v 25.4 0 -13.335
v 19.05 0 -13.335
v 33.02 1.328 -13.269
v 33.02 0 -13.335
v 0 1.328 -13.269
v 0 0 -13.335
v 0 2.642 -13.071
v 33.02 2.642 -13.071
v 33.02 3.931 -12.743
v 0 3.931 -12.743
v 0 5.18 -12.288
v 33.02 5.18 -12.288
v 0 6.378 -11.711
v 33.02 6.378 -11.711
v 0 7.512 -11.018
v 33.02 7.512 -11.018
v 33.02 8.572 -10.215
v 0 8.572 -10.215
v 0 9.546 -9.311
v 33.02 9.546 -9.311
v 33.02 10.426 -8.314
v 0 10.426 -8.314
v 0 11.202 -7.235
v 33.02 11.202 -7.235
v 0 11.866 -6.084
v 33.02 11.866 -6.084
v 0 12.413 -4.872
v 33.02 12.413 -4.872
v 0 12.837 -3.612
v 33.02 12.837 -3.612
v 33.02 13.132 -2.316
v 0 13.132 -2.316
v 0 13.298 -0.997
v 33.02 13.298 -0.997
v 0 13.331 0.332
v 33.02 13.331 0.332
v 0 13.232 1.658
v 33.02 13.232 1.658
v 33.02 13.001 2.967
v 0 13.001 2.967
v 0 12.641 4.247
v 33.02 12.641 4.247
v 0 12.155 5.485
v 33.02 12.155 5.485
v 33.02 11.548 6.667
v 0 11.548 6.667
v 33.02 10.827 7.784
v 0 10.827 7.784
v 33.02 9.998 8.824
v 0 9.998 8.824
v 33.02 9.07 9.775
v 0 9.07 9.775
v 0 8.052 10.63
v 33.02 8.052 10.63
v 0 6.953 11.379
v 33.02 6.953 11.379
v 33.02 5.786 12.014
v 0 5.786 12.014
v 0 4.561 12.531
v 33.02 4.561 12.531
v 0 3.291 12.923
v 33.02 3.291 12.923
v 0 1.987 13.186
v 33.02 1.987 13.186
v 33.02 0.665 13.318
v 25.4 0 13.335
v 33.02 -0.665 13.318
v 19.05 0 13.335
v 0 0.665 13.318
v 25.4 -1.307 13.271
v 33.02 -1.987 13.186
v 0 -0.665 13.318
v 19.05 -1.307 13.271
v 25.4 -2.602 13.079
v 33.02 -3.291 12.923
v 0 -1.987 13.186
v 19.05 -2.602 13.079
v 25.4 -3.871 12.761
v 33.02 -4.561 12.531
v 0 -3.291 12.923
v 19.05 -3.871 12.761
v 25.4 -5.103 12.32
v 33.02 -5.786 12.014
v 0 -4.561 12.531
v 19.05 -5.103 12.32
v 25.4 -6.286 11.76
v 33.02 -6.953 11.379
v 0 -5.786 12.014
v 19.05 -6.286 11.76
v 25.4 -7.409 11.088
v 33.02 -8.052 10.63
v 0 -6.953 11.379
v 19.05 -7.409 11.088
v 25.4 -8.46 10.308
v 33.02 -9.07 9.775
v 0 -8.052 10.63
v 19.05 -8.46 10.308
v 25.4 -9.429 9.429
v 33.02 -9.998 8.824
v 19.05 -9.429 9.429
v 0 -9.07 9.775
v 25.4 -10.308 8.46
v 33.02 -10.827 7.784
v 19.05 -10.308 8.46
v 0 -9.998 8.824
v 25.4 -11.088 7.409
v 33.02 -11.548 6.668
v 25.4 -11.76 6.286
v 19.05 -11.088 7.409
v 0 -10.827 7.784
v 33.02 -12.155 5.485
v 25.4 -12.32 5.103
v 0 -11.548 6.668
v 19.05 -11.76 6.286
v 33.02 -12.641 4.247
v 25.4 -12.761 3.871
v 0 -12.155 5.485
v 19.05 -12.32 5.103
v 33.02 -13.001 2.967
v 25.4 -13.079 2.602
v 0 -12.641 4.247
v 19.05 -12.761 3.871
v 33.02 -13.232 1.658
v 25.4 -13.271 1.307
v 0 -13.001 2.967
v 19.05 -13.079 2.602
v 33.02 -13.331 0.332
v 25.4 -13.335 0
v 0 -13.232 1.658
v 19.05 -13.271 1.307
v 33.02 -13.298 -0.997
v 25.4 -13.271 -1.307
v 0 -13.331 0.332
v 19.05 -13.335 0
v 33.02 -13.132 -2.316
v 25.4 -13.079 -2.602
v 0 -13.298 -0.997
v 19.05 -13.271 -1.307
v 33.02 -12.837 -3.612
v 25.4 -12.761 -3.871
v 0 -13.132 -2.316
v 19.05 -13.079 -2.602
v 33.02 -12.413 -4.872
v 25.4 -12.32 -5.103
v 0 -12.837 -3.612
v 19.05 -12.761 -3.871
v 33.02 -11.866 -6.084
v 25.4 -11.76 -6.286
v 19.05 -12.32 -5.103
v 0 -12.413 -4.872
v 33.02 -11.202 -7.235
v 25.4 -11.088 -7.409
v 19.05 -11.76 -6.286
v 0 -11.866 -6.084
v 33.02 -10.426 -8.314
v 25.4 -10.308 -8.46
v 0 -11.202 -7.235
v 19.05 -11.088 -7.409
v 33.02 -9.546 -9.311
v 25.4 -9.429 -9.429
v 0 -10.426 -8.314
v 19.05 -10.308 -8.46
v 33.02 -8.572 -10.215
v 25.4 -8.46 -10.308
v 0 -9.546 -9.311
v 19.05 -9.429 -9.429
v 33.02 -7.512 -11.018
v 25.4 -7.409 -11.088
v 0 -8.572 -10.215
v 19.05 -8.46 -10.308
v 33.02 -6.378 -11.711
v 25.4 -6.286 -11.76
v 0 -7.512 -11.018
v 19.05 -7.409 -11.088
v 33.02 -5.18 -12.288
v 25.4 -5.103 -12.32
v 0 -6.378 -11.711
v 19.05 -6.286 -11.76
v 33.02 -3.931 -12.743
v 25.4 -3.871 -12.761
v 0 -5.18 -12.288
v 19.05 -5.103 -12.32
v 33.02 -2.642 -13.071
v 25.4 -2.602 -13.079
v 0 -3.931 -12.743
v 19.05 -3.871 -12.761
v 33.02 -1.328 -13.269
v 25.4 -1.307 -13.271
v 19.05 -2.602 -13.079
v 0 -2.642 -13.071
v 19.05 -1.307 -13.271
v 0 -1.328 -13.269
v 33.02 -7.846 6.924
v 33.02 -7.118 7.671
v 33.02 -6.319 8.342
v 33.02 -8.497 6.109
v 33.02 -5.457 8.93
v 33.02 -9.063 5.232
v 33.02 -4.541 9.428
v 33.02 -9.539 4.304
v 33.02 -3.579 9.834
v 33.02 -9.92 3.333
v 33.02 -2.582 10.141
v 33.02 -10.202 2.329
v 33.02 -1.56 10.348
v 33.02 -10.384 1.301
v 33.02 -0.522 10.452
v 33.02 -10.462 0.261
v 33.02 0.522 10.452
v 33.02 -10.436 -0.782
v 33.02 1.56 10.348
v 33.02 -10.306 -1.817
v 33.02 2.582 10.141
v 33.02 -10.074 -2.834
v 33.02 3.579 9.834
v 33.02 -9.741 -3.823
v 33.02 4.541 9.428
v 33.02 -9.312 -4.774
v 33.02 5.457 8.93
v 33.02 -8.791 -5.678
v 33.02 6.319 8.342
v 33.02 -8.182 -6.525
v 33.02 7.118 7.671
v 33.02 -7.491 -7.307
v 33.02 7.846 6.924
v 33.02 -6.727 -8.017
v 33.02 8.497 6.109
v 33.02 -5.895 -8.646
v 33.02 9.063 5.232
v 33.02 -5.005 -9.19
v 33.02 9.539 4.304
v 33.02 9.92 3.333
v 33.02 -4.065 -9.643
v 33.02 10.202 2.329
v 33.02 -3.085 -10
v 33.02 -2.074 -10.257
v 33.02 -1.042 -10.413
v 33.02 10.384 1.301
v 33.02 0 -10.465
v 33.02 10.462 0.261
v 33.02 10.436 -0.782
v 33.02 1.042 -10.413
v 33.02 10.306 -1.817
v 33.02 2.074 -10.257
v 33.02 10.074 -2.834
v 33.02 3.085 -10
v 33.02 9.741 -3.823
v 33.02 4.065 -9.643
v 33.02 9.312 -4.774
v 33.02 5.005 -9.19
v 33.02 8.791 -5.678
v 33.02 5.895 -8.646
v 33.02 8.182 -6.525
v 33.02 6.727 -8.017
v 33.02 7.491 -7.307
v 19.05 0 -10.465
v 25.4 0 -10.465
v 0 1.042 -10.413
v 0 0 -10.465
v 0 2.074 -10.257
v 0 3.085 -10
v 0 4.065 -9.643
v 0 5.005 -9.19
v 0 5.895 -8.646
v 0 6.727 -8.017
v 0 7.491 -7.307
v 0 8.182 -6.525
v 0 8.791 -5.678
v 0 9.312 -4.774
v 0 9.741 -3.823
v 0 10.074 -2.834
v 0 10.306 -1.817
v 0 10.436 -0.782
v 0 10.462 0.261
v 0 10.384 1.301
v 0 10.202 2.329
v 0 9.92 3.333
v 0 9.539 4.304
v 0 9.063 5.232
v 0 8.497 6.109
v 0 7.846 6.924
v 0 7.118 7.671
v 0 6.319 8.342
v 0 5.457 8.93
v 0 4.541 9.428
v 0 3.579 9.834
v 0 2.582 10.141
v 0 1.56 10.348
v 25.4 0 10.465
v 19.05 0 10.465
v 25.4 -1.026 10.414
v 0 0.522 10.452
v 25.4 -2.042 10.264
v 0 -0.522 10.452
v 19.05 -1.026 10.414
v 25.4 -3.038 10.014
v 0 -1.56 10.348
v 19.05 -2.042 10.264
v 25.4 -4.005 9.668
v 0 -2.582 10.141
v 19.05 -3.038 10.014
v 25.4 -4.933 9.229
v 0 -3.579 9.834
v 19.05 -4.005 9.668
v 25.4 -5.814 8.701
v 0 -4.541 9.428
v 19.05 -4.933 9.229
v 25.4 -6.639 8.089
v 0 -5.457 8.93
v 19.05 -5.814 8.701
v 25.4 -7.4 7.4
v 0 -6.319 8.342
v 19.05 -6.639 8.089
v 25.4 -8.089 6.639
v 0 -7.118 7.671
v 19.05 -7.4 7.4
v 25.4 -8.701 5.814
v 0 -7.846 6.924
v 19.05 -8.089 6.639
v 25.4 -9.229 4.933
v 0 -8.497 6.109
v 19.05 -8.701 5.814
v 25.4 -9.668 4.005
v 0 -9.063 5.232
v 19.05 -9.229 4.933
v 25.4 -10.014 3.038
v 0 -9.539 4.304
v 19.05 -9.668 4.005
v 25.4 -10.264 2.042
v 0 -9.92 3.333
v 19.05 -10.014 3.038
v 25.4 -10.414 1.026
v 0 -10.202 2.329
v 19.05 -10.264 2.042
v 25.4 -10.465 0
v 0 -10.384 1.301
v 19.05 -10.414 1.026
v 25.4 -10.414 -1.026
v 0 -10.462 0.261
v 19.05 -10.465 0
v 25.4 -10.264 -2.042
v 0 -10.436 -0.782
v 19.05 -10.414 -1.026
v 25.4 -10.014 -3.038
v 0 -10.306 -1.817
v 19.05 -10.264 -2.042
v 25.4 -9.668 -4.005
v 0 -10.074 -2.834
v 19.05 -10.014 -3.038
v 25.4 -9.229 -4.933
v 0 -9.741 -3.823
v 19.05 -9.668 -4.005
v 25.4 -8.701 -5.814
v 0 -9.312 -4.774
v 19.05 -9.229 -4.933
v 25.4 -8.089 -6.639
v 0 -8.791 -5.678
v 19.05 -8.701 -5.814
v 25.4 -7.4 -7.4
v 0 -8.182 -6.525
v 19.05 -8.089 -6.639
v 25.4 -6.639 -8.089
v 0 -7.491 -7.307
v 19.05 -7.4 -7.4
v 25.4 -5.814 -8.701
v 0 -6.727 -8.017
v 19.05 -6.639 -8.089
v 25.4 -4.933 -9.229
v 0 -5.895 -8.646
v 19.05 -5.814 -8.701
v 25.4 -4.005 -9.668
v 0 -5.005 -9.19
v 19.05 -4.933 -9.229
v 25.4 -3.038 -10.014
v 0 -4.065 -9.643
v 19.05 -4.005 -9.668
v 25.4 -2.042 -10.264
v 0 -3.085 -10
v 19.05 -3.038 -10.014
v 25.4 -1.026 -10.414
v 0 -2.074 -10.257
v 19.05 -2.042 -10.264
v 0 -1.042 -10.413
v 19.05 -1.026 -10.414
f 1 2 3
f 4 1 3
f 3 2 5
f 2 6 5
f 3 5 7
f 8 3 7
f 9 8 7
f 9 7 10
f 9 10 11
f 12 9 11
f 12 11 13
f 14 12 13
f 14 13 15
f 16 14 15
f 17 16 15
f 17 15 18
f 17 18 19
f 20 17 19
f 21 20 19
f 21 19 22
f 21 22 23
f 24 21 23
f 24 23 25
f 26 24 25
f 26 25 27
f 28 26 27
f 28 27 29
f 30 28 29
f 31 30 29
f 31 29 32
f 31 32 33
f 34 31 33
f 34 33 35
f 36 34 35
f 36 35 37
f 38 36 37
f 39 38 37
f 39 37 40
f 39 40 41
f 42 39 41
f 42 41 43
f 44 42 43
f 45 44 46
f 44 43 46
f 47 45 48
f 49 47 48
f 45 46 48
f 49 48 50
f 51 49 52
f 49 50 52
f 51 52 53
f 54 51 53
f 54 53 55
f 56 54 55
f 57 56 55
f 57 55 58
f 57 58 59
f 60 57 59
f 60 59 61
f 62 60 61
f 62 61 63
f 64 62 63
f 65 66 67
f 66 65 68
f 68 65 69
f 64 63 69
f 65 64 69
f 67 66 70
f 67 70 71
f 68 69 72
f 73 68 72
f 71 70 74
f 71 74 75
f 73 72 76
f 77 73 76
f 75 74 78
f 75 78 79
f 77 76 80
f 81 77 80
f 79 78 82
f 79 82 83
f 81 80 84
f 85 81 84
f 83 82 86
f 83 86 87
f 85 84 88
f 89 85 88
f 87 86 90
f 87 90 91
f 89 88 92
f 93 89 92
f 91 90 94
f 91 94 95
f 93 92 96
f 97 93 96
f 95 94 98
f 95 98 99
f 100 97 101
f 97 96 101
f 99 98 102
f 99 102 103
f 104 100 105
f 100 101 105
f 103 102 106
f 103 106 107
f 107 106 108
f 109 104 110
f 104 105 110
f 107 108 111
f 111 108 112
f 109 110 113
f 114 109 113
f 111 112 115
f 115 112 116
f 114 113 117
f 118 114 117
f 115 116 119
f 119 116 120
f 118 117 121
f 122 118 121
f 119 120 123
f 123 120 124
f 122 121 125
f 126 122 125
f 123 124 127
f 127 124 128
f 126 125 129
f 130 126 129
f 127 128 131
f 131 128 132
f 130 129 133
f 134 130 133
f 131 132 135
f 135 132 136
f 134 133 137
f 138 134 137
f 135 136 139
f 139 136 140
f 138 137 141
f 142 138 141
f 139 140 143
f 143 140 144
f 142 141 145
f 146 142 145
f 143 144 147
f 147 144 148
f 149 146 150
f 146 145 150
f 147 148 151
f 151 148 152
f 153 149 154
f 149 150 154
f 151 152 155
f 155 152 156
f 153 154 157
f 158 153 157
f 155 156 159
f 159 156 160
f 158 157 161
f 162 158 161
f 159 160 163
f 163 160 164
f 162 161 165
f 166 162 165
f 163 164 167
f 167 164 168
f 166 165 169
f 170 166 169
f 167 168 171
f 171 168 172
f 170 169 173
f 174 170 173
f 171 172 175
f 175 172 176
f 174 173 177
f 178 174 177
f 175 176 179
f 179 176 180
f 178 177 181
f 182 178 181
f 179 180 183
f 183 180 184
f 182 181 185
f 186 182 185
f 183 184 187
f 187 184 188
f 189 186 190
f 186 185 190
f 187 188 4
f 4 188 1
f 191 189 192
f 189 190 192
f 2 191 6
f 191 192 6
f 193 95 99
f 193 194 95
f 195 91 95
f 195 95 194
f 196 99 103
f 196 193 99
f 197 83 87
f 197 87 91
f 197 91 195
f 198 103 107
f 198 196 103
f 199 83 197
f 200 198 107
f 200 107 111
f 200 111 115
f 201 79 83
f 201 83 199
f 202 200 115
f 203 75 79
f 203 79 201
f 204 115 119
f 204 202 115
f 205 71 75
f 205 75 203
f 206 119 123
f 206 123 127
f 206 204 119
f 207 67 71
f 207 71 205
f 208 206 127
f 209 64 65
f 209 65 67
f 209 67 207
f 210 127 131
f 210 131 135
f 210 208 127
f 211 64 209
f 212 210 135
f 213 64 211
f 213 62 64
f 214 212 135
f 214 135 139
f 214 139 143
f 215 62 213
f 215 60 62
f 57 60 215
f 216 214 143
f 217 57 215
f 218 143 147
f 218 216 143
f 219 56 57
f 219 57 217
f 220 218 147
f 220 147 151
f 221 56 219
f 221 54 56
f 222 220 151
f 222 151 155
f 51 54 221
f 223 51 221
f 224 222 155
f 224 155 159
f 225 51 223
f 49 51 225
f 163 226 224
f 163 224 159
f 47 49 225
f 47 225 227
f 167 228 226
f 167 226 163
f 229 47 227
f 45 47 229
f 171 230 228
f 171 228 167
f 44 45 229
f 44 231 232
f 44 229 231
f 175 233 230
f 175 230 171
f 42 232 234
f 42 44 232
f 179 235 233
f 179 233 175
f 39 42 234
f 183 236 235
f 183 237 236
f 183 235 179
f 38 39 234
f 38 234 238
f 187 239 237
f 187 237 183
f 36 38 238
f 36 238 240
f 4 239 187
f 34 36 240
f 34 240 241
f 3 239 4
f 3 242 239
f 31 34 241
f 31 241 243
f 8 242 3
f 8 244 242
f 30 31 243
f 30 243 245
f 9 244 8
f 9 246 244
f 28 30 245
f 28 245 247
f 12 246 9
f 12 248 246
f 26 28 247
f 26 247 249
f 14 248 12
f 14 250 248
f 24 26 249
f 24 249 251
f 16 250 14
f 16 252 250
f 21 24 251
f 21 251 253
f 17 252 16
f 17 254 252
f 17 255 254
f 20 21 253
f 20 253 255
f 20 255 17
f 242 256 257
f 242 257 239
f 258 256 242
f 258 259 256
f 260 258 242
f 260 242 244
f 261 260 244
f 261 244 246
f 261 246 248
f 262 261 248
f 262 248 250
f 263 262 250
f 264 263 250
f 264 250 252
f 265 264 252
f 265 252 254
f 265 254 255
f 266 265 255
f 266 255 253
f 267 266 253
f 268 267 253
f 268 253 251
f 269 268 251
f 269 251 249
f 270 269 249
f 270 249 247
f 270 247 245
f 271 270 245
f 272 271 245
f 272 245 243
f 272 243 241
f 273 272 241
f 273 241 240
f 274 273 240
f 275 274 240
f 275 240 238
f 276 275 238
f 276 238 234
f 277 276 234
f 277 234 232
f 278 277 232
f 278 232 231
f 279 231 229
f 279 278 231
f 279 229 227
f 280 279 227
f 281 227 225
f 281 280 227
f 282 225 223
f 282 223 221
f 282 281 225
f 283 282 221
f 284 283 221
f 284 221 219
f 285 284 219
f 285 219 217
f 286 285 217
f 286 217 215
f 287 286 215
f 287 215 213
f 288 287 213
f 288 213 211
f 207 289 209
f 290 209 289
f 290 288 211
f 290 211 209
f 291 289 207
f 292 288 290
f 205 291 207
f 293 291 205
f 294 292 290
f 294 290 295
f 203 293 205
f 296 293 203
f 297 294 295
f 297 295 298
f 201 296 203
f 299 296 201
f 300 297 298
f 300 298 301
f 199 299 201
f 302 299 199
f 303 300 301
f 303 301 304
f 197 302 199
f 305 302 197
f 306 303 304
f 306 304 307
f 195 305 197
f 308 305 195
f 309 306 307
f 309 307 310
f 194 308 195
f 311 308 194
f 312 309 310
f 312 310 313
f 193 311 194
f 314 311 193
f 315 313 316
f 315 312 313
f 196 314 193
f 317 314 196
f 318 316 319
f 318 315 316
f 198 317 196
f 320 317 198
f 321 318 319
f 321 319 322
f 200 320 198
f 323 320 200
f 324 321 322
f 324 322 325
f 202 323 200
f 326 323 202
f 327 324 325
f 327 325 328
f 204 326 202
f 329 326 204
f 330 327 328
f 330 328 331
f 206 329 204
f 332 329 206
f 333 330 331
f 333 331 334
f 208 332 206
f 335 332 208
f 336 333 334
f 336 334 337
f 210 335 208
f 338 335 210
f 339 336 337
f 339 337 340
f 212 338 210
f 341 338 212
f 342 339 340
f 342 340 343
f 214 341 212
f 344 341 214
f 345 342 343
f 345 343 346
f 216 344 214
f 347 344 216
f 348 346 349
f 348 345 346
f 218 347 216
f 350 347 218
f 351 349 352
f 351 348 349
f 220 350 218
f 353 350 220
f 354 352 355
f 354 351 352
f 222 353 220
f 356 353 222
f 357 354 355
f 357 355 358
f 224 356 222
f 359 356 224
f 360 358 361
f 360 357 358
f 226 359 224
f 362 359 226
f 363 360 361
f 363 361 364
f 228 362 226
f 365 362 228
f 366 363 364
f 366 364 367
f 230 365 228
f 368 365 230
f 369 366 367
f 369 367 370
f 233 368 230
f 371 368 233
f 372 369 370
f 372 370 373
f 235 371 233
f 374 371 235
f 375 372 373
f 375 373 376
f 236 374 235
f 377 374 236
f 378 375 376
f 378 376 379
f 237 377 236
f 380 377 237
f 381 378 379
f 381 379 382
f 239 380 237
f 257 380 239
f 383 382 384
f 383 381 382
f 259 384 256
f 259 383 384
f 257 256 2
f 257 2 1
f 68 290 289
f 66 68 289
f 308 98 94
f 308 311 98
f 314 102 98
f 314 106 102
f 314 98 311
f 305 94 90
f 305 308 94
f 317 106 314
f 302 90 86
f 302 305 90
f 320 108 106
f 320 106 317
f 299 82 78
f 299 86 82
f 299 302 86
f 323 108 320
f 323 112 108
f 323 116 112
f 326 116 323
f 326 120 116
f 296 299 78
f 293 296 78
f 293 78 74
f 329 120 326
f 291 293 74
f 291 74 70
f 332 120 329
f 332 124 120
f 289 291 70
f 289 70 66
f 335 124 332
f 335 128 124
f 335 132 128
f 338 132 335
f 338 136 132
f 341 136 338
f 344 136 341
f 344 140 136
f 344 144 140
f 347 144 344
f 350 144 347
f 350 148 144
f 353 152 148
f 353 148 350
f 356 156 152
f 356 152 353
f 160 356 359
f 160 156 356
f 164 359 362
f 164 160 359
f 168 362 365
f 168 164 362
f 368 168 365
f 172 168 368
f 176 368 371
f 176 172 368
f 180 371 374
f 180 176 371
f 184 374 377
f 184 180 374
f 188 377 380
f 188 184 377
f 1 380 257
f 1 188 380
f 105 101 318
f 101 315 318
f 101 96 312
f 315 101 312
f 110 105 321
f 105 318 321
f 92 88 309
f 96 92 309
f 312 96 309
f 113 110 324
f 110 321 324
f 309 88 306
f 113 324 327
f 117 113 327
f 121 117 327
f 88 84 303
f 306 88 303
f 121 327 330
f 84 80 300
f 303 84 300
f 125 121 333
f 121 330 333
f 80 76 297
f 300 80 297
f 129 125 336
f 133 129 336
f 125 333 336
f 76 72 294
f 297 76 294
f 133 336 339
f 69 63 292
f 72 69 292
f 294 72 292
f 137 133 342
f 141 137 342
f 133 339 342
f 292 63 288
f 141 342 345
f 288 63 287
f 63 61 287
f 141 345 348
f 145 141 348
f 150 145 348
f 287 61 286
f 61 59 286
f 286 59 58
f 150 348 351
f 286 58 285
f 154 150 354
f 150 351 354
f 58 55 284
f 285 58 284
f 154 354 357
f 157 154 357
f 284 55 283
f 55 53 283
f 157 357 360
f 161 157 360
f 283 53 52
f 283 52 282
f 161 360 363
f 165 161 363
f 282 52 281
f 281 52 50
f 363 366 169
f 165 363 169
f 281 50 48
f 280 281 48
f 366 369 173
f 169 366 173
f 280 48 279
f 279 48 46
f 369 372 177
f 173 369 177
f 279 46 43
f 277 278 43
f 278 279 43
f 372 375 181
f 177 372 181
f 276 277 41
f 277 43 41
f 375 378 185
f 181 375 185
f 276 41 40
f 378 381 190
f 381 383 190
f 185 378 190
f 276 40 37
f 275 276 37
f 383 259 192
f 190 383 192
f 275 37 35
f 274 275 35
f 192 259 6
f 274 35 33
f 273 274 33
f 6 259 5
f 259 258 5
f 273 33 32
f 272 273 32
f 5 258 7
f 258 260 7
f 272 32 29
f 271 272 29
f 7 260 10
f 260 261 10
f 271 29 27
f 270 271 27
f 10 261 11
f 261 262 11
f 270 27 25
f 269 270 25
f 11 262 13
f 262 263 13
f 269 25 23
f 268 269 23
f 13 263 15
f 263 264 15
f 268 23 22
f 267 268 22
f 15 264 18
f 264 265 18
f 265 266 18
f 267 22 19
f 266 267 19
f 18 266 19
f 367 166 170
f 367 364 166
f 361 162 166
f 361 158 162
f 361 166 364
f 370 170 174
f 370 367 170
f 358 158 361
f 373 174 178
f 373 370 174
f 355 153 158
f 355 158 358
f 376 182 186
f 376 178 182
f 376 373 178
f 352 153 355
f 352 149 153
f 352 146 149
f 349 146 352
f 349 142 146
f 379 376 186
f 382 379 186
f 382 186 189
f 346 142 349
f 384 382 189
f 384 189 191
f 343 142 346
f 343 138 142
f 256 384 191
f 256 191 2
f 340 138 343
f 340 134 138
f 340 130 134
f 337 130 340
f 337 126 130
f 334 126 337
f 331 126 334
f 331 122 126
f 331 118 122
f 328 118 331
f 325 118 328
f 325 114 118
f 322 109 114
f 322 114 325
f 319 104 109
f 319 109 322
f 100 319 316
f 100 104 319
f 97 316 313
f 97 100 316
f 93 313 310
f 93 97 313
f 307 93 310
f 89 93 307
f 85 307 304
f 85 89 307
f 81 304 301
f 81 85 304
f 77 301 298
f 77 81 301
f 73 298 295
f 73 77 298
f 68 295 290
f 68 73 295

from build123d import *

# Parameters (mm, degrees)
SKETCH1_R               = 13.335
SKETCH1_R_2             = 10.4648
BOSS_EXTRUDE1_DEPTH     = 33.02
SKETCH2_W               = 6.35
SKETCH2_H               = 13.335
CUT_EXTRUDE1_DEPTH      = 14.335
CUT_EXTRUDE1_DEPTH_BACK = 14.335


with BuildPart() as part:
    # Sketch1 → Boss-Extrude1 (new body)
    with BuildSketch(Plane(origin=(0, 0, 0), x_dir=(0, 0, -1), z_dir=(1, 0, 0))):
        Circle(SKETCH1_R)
        Circle(SKETCH1_R_2, mode=Mode.SUBTRACT)
    extrude(amount=BOSS_EXTRUDE1_DEPTH)

    # Sketch2 → Cut-Extrude1 (cut, two sides)
    with BuildSketch(Plane.XY) as cut_extrude1_sk:
        with Locations((22.225, -6.6675)):
            Rectangle(SKETCH2_W, SKETCH2_H)
    extrude(amount=CUT_EXTRUDE1_DEPTH, mode=Mode.SUBTRACT)
    extrude(cut_extrude1_sk.sketch, amount=-CUT_EXTRUDE1_DEPTH_BACK, mode=Mode.SUBTRACT)


solid = part.part
